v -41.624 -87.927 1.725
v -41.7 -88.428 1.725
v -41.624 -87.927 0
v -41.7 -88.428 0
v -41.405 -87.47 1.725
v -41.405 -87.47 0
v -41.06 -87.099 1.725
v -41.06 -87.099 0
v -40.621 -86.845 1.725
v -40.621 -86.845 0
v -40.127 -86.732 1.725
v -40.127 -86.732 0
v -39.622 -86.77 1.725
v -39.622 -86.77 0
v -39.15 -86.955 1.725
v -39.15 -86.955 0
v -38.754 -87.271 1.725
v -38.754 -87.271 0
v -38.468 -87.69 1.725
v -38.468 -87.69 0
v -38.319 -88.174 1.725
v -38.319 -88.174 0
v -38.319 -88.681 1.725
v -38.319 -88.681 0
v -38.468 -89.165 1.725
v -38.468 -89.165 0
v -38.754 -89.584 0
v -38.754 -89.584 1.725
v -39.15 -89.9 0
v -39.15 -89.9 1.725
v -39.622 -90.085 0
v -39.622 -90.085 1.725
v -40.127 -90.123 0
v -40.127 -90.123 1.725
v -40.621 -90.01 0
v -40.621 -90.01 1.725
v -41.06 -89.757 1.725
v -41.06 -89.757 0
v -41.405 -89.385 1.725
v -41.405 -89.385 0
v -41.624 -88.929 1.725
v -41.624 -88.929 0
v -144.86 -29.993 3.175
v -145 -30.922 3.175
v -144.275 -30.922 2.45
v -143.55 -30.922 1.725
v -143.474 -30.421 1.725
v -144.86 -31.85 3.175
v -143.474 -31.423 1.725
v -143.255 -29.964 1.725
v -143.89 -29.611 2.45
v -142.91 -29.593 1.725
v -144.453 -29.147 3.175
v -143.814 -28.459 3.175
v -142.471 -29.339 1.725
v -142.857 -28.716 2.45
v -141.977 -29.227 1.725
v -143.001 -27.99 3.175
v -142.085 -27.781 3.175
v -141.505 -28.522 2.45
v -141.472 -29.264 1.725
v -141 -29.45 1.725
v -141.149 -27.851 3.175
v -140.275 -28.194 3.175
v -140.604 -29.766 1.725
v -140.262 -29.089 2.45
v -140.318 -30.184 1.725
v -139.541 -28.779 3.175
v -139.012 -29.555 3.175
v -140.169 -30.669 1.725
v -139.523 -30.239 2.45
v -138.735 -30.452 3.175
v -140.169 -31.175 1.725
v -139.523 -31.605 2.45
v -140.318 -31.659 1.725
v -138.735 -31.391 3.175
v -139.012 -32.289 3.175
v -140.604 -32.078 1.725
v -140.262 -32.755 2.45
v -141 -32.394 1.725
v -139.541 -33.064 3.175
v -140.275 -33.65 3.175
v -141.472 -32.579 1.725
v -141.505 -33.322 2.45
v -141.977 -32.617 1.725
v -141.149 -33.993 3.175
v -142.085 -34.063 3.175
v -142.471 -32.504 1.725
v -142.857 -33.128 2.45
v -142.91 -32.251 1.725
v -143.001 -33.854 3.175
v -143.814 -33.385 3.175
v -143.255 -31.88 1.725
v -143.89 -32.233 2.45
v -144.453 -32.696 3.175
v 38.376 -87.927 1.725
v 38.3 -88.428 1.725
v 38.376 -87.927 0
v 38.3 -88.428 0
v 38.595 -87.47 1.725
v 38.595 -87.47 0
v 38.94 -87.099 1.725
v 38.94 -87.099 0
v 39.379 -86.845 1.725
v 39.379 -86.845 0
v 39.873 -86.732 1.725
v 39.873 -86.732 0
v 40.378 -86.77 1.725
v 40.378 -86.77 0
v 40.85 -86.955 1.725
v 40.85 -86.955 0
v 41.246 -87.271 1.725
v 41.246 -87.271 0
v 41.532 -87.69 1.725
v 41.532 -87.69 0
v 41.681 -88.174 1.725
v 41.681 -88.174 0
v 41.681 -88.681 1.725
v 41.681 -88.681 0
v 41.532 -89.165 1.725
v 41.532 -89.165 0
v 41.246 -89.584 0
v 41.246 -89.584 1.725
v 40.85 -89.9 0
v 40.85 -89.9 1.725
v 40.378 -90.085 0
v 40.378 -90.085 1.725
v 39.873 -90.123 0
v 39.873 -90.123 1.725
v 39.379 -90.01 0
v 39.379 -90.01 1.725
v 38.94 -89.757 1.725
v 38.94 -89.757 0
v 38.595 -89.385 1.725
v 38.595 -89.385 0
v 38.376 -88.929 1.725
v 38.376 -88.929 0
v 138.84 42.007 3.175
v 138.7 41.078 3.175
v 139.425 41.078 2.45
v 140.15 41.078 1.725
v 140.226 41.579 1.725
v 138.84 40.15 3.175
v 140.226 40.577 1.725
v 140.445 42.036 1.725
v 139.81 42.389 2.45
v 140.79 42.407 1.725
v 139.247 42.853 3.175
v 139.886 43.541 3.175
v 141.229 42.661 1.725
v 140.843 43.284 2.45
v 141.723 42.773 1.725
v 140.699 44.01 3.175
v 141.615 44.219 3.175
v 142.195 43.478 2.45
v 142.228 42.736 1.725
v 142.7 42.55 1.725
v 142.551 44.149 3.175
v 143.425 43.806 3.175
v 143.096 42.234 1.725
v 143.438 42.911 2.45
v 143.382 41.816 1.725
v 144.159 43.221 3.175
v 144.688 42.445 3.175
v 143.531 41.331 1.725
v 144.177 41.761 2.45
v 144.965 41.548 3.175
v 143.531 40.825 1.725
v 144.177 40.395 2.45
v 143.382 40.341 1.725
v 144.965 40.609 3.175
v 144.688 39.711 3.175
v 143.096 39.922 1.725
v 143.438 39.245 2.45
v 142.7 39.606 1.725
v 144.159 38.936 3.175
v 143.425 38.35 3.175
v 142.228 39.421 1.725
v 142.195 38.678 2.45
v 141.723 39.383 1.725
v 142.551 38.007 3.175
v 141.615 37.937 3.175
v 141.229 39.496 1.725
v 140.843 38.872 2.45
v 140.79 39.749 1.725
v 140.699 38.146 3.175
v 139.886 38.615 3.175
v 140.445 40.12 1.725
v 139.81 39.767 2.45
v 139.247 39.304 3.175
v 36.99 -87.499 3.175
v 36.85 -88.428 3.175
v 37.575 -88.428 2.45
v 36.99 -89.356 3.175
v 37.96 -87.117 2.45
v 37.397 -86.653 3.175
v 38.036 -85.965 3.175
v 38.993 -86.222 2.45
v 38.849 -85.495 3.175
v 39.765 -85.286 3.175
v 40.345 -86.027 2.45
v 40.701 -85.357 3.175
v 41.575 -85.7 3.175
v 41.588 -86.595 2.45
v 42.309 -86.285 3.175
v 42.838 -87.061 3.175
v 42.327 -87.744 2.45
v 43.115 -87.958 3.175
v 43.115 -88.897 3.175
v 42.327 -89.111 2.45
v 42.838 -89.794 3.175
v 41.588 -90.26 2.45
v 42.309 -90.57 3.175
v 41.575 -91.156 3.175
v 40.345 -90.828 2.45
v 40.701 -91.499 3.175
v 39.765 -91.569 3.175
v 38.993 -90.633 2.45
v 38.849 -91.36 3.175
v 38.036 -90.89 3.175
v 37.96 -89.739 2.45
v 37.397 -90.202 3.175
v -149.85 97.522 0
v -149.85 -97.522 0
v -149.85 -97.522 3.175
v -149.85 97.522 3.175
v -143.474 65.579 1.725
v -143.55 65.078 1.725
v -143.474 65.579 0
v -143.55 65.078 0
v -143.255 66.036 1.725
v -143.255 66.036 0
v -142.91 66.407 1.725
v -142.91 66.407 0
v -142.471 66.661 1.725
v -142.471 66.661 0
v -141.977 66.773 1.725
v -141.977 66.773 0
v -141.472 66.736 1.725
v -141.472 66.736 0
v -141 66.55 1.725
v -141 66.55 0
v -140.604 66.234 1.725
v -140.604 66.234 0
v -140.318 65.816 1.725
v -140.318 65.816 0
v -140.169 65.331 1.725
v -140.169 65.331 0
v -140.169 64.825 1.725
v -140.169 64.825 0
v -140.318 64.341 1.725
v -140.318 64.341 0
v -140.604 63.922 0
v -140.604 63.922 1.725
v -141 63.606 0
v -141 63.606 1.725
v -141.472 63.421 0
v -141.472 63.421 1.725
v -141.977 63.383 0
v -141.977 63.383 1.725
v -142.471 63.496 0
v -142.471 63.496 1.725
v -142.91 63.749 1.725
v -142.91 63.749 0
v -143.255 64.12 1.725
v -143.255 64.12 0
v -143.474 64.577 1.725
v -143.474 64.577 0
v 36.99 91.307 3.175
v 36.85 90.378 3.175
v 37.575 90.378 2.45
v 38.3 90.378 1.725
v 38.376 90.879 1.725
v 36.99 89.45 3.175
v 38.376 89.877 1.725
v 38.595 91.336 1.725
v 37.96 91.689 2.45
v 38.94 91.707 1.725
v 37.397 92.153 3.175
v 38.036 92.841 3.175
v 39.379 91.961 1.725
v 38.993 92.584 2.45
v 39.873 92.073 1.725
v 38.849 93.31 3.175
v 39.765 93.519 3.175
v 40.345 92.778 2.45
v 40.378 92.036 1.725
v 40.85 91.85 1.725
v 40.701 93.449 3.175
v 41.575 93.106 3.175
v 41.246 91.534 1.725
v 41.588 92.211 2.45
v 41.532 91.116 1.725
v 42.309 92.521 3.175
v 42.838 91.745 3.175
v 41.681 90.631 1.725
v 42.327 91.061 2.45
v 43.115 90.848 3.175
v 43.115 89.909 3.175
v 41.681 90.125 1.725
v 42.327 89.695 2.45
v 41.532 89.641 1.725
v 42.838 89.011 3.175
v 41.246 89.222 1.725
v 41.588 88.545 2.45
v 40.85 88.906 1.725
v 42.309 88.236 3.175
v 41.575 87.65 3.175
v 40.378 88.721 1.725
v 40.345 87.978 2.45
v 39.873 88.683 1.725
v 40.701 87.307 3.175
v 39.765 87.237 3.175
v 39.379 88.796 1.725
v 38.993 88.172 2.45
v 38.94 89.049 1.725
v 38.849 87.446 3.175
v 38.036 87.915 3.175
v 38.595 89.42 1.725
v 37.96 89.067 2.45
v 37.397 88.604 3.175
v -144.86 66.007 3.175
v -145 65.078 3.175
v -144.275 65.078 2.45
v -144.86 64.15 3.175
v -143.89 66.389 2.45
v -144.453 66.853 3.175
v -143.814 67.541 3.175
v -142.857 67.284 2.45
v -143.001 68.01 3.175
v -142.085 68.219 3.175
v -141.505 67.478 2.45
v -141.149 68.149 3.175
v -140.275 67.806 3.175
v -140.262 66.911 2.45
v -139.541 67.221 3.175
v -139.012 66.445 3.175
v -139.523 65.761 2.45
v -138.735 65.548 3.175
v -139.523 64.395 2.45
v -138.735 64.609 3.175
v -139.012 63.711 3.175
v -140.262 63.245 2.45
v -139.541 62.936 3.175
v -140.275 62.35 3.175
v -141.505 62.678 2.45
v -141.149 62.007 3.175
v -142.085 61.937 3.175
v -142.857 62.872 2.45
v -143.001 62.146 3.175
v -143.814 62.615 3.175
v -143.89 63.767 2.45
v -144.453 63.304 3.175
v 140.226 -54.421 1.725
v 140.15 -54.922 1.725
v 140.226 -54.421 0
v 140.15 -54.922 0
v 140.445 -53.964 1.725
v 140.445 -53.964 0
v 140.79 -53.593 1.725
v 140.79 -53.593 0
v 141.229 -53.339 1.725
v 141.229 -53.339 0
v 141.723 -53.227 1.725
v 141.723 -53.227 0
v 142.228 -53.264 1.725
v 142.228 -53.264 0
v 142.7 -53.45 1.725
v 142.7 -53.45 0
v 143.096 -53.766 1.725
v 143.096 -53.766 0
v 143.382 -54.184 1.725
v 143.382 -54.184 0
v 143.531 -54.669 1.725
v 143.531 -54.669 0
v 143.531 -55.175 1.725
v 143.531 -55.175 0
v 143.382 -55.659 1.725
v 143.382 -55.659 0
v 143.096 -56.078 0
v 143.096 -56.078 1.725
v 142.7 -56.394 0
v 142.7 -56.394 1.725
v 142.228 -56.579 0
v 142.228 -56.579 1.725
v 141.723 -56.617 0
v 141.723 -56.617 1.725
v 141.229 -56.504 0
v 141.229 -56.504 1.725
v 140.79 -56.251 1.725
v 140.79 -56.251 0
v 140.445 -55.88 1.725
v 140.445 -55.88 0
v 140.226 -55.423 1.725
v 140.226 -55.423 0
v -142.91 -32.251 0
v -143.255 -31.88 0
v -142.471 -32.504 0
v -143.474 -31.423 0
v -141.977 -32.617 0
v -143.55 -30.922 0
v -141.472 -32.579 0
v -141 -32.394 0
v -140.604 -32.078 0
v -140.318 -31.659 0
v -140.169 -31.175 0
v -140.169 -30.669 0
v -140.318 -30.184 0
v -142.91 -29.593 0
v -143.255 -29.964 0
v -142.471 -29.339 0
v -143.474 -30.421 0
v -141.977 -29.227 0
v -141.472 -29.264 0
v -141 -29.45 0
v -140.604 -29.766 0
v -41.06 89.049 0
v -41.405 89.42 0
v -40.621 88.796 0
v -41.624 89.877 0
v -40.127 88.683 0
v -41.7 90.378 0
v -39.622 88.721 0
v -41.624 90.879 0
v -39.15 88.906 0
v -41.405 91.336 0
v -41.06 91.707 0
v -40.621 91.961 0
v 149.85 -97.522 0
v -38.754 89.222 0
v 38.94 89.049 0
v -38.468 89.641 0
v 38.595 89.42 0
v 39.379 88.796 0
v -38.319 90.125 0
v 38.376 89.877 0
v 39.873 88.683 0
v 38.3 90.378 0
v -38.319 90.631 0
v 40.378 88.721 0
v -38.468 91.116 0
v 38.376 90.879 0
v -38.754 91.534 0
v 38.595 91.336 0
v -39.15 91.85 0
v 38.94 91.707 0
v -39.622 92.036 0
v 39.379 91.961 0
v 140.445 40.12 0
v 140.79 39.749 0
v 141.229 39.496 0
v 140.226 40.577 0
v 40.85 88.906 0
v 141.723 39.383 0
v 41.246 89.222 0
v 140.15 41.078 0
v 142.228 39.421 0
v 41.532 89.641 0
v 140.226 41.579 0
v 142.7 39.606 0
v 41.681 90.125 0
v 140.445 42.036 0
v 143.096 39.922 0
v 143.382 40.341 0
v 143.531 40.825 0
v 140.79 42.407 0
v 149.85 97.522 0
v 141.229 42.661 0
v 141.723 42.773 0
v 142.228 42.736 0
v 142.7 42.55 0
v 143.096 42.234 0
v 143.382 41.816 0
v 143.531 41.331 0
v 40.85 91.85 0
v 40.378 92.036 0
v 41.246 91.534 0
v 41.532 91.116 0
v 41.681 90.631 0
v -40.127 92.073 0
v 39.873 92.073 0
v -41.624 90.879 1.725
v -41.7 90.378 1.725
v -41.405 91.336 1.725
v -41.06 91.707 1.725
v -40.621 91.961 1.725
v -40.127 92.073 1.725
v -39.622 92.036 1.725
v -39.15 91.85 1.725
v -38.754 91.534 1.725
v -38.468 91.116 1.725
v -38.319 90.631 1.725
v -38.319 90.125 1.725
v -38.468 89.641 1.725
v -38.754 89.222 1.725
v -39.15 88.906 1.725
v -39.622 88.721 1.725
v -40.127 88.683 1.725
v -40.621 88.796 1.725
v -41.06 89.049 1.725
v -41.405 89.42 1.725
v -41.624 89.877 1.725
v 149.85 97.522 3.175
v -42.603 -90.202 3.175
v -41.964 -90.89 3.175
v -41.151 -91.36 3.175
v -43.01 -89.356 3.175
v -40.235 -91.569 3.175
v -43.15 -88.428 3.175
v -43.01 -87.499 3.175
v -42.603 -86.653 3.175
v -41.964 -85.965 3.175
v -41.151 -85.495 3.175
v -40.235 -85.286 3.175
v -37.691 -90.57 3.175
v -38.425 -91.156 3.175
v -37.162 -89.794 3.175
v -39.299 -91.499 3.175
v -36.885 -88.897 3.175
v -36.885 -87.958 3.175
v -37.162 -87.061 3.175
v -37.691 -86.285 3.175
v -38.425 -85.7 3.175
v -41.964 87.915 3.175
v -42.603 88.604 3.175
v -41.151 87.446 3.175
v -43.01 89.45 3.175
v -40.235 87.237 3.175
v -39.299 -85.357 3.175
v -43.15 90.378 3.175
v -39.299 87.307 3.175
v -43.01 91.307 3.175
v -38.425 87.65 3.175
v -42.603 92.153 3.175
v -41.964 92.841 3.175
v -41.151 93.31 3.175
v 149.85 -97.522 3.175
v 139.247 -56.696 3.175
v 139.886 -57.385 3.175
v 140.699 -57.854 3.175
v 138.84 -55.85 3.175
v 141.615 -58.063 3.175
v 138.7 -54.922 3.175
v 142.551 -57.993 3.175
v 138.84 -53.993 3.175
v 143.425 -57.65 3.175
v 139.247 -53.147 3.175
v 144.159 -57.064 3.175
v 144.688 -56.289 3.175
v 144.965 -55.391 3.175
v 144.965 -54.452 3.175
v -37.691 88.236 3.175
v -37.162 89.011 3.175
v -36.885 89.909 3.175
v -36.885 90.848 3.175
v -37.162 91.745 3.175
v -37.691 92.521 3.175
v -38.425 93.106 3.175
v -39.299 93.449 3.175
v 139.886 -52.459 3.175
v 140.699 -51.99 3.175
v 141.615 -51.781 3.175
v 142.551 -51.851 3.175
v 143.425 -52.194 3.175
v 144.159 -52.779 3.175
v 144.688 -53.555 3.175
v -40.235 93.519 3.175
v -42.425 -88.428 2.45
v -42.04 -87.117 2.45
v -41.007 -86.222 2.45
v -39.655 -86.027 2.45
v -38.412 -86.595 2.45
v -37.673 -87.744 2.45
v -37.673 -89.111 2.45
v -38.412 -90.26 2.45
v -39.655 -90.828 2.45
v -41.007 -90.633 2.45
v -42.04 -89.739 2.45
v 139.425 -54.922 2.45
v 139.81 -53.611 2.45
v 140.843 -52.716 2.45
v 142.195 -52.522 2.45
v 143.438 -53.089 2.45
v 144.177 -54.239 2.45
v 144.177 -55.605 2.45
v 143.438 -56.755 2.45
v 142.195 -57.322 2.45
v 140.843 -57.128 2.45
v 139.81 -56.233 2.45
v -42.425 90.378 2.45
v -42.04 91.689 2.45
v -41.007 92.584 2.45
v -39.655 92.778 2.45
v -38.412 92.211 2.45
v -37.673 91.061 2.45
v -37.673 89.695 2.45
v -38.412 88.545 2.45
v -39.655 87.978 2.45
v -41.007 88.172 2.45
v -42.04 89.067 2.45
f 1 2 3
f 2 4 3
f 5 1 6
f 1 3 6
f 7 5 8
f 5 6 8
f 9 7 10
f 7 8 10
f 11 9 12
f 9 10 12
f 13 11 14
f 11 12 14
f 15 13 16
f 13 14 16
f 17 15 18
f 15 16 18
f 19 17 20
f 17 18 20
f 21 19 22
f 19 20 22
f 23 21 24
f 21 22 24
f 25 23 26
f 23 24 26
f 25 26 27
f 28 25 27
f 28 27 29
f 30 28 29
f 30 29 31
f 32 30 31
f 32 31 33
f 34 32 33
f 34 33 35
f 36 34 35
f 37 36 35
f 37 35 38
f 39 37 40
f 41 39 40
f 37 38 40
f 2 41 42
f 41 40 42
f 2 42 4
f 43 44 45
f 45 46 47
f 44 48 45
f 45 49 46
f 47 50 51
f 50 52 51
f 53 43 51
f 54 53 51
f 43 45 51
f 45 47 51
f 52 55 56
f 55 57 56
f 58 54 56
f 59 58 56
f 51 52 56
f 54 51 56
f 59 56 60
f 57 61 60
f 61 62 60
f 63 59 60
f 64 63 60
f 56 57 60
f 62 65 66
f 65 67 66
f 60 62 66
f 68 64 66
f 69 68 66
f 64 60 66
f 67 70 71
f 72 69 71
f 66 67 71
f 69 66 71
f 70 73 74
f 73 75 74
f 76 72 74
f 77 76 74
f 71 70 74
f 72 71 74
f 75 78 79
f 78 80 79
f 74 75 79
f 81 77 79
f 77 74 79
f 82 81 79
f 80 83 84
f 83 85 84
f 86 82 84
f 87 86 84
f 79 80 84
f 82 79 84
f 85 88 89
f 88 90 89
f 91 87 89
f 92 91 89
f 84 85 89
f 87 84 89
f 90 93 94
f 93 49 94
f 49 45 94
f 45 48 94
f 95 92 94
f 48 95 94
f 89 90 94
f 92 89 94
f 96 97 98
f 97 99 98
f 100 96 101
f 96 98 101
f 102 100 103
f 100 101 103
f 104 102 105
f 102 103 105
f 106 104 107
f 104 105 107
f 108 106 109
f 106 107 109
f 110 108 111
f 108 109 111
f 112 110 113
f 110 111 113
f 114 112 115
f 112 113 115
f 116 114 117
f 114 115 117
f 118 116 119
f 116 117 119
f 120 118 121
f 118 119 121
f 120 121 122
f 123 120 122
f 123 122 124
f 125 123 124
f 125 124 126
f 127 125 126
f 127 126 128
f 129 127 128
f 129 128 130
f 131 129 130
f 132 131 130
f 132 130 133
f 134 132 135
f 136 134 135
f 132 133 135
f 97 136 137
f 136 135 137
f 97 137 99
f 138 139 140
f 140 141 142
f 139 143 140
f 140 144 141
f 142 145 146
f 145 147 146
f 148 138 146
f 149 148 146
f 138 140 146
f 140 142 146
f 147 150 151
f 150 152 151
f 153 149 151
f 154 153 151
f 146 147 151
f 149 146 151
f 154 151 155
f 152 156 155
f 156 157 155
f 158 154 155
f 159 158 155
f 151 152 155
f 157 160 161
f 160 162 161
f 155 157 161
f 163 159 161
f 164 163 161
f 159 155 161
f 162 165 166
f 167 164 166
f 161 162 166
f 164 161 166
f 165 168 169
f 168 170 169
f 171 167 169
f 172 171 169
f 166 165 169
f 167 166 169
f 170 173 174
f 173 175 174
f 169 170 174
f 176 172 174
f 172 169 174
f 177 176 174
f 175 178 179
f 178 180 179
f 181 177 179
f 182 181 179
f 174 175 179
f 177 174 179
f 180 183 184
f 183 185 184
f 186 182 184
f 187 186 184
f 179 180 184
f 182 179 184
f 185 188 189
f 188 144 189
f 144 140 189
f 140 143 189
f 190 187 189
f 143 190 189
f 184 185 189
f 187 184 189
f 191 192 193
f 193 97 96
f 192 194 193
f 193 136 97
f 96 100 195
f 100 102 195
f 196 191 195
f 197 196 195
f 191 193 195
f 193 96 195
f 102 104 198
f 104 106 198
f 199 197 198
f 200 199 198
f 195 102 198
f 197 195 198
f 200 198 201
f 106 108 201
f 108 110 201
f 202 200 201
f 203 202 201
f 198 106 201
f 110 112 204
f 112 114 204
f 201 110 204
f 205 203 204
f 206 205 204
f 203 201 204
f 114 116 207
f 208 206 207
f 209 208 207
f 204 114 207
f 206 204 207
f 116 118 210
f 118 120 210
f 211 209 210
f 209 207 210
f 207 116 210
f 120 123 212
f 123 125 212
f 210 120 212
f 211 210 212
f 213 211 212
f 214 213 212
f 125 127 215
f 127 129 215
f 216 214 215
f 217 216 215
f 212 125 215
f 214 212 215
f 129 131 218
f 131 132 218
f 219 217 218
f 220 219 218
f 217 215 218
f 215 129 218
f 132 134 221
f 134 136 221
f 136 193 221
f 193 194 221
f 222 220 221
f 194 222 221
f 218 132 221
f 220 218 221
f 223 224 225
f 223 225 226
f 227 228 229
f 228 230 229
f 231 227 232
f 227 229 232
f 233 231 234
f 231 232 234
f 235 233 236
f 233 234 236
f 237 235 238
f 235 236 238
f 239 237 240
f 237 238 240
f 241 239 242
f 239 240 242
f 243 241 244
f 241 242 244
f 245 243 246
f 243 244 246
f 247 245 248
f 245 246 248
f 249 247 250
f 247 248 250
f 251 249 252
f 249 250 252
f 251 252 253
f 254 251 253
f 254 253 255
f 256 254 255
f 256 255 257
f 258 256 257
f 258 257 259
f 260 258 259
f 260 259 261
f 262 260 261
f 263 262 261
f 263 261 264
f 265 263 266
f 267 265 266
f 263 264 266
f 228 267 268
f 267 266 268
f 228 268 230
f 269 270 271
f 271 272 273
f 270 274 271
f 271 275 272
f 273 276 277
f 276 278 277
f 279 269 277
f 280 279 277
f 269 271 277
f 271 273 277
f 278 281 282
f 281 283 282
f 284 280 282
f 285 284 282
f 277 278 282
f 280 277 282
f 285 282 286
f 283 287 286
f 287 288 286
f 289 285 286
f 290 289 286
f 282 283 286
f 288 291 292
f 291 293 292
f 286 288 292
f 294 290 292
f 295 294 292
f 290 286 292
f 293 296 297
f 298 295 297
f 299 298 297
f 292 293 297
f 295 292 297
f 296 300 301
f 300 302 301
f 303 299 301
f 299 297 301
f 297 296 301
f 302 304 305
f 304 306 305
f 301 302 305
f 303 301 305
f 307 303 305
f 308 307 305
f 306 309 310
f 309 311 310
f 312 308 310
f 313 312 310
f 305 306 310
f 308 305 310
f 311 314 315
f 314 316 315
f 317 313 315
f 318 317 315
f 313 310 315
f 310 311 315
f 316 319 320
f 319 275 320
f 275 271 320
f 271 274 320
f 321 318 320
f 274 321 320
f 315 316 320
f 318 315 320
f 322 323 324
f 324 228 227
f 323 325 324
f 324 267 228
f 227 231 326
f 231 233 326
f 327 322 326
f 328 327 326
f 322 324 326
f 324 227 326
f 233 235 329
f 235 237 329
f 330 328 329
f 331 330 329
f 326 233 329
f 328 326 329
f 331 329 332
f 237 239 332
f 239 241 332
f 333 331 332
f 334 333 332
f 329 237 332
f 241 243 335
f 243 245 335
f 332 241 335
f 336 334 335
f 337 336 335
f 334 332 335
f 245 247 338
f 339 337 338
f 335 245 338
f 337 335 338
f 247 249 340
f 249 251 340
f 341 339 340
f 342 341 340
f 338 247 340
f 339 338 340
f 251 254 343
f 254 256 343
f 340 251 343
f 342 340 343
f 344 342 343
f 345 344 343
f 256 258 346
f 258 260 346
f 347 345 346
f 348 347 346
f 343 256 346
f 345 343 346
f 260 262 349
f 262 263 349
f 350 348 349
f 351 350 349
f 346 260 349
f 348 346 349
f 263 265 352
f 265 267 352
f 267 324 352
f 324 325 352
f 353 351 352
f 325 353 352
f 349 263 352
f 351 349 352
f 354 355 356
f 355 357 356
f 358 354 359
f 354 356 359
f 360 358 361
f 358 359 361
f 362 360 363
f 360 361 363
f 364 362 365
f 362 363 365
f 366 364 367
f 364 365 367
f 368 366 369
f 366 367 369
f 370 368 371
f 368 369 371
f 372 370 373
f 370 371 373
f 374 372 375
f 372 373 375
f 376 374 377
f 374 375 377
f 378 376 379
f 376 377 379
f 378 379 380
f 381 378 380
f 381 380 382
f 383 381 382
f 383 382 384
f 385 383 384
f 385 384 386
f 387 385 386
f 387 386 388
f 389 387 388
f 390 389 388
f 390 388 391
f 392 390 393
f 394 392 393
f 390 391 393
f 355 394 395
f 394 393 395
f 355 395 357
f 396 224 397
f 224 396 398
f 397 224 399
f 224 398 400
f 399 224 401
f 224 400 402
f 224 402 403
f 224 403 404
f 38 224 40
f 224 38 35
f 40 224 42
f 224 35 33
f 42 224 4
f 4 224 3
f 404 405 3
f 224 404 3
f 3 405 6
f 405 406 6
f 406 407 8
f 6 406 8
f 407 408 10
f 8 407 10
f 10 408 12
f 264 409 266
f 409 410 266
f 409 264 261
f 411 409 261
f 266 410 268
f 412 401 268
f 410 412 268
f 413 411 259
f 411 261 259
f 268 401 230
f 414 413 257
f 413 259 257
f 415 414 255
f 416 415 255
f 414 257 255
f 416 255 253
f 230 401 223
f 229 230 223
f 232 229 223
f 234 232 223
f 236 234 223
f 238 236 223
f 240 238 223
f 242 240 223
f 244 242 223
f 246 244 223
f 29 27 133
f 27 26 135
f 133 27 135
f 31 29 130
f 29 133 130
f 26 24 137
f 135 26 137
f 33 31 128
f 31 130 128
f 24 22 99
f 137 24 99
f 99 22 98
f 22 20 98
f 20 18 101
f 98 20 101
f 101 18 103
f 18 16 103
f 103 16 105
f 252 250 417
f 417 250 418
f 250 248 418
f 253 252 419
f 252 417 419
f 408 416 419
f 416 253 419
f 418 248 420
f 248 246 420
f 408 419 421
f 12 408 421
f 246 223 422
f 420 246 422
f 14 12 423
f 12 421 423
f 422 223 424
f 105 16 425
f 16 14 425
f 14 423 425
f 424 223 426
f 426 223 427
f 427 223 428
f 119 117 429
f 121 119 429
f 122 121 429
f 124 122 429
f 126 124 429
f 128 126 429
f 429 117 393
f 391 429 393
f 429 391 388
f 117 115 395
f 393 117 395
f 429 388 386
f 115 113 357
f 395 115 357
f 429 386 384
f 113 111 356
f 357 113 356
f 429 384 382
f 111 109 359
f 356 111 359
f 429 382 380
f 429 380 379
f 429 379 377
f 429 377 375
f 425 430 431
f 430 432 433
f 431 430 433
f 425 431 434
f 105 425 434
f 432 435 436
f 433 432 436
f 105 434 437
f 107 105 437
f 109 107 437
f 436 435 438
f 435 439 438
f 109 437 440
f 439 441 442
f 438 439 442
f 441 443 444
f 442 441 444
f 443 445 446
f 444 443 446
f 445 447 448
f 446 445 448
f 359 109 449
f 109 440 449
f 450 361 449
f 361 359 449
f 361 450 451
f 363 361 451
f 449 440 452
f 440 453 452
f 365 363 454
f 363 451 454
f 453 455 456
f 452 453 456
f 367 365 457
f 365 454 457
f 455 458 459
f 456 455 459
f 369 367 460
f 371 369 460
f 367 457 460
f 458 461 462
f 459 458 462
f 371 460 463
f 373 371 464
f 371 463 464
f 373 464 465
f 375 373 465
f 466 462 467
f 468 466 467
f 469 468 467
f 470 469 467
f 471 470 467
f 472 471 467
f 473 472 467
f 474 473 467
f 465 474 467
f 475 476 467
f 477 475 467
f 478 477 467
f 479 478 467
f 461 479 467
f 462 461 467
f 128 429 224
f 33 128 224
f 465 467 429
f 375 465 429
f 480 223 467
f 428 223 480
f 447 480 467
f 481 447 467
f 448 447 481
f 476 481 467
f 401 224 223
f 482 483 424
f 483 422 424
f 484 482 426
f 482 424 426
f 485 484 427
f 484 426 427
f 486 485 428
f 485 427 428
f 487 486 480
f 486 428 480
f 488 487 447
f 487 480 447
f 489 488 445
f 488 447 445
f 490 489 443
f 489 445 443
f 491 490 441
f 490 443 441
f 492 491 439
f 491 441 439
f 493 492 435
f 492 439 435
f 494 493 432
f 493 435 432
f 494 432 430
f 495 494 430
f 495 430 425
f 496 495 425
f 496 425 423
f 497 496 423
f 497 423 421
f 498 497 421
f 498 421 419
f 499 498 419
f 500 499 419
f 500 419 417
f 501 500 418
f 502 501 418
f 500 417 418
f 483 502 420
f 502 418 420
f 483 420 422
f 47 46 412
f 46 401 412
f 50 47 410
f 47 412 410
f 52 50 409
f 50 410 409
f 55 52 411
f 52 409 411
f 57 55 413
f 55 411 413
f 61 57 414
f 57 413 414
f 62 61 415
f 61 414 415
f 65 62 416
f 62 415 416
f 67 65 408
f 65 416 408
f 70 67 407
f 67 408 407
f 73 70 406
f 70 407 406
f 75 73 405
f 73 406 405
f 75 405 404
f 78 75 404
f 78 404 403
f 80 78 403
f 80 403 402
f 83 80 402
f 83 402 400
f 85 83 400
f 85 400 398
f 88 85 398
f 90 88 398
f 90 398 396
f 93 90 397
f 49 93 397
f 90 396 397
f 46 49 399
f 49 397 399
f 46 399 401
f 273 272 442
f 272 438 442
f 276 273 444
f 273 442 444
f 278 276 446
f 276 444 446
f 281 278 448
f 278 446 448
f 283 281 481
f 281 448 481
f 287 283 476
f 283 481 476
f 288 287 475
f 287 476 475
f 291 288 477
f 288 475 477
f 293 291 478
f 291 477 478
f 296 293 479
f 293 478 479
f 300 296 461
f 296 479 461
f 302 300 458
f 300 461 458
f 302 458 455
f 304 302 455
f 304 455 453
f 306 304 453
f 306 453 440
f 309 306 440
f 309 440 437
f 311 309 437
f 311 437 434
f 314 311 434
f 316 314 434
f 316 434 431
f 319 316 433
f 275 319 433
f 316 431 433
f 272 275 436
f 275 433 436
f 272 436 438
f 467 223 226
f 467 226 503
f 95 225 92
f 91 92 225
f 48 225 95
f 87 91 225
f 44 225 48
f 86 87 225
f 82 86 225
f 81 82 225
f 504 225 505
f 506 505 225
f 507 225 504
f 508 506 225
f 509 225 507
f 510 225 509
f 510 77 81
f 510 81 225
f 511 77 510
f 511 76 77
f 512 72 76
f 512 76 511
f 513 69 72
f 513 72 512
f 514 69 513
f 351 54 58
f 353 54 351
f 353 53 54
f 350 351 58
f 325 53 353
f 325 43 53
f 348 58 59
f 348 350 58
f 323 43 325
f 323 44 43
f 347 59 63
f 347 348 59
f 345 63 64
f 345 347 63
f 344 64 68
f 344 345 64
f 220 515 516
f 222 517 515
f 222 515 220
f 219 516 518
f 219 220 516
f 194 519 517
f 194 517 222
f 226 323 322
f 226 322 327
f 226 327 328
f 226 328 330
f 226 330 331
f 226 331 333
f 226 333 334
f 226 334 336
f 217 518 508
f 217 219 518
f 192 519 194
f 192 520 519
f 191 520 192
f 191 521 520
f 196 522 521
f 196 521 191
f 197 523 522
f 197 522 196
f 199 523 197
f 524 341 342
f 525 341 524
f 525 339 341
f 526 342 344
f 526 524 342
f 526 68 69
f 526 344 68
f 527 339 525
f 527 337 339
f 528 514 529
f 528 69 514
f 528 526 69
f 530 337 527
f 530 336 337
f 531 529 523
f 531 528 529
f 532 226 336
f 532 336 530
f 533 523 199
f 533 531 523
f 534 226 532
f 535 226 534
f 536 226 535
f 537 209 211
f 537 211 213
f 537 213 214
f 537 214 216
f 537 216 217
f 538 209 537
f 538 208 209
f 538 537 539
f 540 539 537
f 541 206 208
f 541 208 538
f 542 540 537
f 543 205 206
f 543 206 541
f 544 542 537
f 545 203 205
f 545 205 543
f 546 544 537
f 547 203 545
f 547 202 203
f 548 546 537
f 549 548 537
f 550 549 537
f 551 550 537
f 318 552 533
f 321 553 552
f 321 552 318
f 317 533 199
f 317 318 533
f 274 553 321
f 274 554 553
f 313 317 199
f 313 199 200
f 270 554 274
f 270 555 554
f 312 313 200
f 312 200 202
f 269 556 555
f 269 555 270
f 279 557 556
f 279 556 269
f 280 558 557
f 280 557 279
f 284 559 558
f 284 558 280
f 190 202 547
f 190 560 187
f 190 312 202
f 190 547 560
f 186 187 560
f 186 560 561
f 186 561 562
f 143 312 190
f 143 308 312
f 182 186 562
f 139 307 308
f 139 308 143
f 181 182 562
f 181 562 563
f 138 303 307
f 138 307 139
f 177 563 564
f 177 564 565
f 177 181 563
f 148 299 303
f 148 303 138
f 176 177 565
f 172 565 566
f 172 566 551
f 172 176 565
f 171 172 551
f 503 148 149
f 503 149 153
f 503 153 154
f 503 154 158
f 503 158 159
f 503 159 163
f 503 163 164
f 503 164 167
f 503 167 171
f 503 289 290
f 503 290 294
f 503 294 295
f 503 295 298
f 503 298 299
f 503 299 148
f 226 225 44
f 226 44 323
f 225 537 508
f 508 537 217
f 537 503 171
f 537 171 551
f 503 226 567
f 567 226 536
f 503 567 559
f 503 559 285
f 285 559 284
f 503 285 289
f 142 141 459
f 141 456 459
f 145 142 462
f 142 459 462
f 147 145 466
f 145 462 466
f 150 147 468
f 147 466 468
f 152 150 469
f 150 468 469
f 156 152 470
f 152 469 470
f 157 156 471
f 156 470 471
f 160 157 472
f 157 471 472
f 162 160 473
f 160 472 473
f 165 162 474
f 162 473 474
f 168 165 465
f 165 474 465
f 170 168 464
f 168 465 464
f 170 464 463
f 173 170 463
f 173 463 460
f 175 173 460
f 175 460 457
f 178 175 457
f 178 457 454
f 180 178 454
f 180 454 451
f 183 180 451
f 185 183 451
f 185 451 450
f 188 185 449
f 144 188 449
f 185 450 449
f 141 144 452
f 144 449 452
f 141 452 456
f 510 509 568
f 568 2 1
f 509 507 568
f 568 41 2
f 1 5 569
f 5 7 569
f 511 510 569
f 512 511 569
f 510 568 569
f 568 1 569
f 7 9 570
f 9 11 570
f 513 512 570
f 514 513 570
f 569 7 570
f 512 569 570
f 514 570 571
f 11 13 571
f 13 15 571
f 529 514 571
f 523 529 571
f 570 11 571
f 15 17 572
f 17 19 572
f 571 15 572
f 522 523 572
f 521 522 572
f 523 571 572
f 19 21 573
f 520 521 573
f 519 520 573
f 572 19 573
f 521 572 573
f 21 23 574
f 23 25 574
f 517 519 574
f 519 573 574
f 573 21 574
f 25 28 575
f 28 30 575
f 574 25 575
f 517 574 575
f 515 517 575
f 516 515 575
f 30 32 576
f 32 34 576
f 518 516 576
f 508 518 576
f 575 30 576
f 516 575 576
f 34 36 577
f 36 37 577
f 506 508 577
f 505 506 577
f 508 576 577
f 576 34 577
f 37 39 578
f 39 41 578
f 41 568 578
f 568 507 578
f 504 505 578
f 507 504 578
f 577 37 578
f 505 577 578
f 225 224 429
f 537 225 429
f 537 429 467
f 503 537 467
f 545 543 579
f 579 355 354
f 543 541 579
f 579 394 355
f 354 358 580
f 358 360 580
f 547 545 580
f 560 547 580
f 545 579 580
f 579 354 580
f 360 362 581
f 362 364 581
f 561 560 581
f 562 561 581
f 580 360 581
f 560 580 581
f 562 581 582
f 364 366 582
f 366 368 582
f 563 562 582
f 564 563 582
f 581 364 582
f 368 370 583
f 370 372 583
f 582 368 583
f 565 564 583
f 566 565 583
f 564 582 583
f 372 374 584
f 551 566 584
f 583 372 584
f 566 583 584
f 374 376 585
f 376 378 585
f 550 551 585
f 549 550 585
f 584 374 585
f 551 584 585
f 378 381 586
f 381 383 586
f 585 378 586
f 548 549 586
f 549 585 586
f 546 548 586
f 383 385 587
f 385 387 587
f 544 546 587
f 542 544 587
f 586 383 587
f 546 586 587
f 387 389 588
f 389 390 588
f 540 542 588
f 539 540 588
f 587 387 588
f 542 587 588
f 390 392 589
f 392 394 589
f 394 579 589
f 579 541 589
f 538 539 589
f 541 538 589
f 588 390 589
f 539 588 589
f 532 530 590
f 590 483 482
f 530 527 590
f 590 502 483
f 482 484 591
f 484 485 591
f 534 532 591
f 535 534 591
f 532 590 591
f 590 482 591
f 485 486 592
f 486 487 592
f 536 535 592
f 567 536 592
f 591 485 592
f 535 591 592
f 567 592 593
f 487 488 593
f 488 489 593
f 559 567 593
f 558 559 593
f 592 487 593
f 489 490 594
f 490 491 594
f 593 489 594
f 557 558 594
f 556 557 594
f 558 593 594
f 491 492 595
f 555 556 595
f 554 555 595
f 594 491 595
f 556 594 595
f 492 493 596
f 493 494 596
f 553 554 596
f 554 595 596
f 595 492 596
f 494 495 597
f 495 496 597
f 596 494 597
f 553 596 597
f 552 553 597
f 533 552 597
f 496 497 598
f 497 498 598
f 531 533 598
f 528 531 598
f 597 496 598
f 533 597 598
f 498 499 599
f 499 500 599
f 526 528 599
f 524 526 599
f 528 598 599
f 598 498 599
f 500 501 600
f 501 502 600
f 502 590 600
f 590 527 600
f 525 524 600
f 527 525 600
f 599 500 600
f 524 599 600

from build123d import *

# Parameters (mm, degrees)
SKETCH1_W                                       = 299.7
SKETCH1_H                                       = 195.04375
SKETCH1_R                                       = 10.775
BOSS_EXTRUDE1_DEPTH                             = 3.175
CSK_FOR_M3_FLAT_HEAD_MACHINE_SCREW1_D           = 3.4
CSK_FOR_M3_FLAT_HEAD_MACHINE_SCREW1_CSINK_D     = 6.3
CSK_FOR_M3_FLAT_HEAD_MACHINE_SCREW1_CSINK_ANGLE = 90


with BuildPart() as part:
    # Sketch1 → Boss-Extrude1 (new body)
    # profile 1 of 5: a face of its own
    with BuildSketch(Plane.XY):
        Rectangle(SKETCH1_W, SKETCH1_H)
        with Locations((-139.075, -86.746875)):
            Circle(SKETCH1_R, mode=Mode.SUBTRACT)
        with Locations((-127.075, -63.746875)):
            Circle(SKETCH1_R, mode=Mode.SUBTRACT)
    # profile 2 of 5: a face of its own
    with BuildSketch(Plane.XY):
        with Locations((-127.075, -63.746875)):
            Circle(SKETCH1_R)
    # profile 3 of 5: a face of its own
    with BuildSketch(Plane.XY):
        with Locations((-139.075, -86.746875)):
            Circle(SKETCH1_R)
    # profile 4 of 5: a face of its own
    with BuildSketch(Plane.XY):
        with BuildLine():
            ThreePointArc((-139.075, -97.521875), (-146.694075567, -94.365950567), (-149.85, -86.746875))
            Line((-149.85, -86.746875), (-149.85, -97.521875))
            Line((-149.85, -97.521875), (-139.075, -97.521875))
        make_face()
    # profile 5 of 5: a face of its own
    with BuildSketch(Plane.XY):
        Rectangle(SKETCH1_W, SKETCH1_H)
    extrude(amount=BOSS_EXTRUDE1_DEPTH)

    # CSK for M3 Flat Head Machine Screw1 (through all)
    with Locations(Plane.XY.offset(3.175)):
        with Locations((-40, 90.378125052), (40, 90.378125052), (141.850000066, 41.078125052), (141.850000066, -54.921874948), (40, -88.427624948), (-40, -88.427624948), (-141.850000066, -30.921874948), (-141.850000066, 65.078125052)):
            CounterSinkHole(CSK_FOR_M3_FLAT_HEAD_MACHINE_SCREW1_D / 2, CSK_FOR_M3_FLAT_HEAD_MACHINE_SCREW1_CSINK_D / 2, counter_sink_angle=CSK_FOR_M3_FLAT_HEAD_MACHINE_SCREW1_CSINK_ANGLE)


solid = part.part
